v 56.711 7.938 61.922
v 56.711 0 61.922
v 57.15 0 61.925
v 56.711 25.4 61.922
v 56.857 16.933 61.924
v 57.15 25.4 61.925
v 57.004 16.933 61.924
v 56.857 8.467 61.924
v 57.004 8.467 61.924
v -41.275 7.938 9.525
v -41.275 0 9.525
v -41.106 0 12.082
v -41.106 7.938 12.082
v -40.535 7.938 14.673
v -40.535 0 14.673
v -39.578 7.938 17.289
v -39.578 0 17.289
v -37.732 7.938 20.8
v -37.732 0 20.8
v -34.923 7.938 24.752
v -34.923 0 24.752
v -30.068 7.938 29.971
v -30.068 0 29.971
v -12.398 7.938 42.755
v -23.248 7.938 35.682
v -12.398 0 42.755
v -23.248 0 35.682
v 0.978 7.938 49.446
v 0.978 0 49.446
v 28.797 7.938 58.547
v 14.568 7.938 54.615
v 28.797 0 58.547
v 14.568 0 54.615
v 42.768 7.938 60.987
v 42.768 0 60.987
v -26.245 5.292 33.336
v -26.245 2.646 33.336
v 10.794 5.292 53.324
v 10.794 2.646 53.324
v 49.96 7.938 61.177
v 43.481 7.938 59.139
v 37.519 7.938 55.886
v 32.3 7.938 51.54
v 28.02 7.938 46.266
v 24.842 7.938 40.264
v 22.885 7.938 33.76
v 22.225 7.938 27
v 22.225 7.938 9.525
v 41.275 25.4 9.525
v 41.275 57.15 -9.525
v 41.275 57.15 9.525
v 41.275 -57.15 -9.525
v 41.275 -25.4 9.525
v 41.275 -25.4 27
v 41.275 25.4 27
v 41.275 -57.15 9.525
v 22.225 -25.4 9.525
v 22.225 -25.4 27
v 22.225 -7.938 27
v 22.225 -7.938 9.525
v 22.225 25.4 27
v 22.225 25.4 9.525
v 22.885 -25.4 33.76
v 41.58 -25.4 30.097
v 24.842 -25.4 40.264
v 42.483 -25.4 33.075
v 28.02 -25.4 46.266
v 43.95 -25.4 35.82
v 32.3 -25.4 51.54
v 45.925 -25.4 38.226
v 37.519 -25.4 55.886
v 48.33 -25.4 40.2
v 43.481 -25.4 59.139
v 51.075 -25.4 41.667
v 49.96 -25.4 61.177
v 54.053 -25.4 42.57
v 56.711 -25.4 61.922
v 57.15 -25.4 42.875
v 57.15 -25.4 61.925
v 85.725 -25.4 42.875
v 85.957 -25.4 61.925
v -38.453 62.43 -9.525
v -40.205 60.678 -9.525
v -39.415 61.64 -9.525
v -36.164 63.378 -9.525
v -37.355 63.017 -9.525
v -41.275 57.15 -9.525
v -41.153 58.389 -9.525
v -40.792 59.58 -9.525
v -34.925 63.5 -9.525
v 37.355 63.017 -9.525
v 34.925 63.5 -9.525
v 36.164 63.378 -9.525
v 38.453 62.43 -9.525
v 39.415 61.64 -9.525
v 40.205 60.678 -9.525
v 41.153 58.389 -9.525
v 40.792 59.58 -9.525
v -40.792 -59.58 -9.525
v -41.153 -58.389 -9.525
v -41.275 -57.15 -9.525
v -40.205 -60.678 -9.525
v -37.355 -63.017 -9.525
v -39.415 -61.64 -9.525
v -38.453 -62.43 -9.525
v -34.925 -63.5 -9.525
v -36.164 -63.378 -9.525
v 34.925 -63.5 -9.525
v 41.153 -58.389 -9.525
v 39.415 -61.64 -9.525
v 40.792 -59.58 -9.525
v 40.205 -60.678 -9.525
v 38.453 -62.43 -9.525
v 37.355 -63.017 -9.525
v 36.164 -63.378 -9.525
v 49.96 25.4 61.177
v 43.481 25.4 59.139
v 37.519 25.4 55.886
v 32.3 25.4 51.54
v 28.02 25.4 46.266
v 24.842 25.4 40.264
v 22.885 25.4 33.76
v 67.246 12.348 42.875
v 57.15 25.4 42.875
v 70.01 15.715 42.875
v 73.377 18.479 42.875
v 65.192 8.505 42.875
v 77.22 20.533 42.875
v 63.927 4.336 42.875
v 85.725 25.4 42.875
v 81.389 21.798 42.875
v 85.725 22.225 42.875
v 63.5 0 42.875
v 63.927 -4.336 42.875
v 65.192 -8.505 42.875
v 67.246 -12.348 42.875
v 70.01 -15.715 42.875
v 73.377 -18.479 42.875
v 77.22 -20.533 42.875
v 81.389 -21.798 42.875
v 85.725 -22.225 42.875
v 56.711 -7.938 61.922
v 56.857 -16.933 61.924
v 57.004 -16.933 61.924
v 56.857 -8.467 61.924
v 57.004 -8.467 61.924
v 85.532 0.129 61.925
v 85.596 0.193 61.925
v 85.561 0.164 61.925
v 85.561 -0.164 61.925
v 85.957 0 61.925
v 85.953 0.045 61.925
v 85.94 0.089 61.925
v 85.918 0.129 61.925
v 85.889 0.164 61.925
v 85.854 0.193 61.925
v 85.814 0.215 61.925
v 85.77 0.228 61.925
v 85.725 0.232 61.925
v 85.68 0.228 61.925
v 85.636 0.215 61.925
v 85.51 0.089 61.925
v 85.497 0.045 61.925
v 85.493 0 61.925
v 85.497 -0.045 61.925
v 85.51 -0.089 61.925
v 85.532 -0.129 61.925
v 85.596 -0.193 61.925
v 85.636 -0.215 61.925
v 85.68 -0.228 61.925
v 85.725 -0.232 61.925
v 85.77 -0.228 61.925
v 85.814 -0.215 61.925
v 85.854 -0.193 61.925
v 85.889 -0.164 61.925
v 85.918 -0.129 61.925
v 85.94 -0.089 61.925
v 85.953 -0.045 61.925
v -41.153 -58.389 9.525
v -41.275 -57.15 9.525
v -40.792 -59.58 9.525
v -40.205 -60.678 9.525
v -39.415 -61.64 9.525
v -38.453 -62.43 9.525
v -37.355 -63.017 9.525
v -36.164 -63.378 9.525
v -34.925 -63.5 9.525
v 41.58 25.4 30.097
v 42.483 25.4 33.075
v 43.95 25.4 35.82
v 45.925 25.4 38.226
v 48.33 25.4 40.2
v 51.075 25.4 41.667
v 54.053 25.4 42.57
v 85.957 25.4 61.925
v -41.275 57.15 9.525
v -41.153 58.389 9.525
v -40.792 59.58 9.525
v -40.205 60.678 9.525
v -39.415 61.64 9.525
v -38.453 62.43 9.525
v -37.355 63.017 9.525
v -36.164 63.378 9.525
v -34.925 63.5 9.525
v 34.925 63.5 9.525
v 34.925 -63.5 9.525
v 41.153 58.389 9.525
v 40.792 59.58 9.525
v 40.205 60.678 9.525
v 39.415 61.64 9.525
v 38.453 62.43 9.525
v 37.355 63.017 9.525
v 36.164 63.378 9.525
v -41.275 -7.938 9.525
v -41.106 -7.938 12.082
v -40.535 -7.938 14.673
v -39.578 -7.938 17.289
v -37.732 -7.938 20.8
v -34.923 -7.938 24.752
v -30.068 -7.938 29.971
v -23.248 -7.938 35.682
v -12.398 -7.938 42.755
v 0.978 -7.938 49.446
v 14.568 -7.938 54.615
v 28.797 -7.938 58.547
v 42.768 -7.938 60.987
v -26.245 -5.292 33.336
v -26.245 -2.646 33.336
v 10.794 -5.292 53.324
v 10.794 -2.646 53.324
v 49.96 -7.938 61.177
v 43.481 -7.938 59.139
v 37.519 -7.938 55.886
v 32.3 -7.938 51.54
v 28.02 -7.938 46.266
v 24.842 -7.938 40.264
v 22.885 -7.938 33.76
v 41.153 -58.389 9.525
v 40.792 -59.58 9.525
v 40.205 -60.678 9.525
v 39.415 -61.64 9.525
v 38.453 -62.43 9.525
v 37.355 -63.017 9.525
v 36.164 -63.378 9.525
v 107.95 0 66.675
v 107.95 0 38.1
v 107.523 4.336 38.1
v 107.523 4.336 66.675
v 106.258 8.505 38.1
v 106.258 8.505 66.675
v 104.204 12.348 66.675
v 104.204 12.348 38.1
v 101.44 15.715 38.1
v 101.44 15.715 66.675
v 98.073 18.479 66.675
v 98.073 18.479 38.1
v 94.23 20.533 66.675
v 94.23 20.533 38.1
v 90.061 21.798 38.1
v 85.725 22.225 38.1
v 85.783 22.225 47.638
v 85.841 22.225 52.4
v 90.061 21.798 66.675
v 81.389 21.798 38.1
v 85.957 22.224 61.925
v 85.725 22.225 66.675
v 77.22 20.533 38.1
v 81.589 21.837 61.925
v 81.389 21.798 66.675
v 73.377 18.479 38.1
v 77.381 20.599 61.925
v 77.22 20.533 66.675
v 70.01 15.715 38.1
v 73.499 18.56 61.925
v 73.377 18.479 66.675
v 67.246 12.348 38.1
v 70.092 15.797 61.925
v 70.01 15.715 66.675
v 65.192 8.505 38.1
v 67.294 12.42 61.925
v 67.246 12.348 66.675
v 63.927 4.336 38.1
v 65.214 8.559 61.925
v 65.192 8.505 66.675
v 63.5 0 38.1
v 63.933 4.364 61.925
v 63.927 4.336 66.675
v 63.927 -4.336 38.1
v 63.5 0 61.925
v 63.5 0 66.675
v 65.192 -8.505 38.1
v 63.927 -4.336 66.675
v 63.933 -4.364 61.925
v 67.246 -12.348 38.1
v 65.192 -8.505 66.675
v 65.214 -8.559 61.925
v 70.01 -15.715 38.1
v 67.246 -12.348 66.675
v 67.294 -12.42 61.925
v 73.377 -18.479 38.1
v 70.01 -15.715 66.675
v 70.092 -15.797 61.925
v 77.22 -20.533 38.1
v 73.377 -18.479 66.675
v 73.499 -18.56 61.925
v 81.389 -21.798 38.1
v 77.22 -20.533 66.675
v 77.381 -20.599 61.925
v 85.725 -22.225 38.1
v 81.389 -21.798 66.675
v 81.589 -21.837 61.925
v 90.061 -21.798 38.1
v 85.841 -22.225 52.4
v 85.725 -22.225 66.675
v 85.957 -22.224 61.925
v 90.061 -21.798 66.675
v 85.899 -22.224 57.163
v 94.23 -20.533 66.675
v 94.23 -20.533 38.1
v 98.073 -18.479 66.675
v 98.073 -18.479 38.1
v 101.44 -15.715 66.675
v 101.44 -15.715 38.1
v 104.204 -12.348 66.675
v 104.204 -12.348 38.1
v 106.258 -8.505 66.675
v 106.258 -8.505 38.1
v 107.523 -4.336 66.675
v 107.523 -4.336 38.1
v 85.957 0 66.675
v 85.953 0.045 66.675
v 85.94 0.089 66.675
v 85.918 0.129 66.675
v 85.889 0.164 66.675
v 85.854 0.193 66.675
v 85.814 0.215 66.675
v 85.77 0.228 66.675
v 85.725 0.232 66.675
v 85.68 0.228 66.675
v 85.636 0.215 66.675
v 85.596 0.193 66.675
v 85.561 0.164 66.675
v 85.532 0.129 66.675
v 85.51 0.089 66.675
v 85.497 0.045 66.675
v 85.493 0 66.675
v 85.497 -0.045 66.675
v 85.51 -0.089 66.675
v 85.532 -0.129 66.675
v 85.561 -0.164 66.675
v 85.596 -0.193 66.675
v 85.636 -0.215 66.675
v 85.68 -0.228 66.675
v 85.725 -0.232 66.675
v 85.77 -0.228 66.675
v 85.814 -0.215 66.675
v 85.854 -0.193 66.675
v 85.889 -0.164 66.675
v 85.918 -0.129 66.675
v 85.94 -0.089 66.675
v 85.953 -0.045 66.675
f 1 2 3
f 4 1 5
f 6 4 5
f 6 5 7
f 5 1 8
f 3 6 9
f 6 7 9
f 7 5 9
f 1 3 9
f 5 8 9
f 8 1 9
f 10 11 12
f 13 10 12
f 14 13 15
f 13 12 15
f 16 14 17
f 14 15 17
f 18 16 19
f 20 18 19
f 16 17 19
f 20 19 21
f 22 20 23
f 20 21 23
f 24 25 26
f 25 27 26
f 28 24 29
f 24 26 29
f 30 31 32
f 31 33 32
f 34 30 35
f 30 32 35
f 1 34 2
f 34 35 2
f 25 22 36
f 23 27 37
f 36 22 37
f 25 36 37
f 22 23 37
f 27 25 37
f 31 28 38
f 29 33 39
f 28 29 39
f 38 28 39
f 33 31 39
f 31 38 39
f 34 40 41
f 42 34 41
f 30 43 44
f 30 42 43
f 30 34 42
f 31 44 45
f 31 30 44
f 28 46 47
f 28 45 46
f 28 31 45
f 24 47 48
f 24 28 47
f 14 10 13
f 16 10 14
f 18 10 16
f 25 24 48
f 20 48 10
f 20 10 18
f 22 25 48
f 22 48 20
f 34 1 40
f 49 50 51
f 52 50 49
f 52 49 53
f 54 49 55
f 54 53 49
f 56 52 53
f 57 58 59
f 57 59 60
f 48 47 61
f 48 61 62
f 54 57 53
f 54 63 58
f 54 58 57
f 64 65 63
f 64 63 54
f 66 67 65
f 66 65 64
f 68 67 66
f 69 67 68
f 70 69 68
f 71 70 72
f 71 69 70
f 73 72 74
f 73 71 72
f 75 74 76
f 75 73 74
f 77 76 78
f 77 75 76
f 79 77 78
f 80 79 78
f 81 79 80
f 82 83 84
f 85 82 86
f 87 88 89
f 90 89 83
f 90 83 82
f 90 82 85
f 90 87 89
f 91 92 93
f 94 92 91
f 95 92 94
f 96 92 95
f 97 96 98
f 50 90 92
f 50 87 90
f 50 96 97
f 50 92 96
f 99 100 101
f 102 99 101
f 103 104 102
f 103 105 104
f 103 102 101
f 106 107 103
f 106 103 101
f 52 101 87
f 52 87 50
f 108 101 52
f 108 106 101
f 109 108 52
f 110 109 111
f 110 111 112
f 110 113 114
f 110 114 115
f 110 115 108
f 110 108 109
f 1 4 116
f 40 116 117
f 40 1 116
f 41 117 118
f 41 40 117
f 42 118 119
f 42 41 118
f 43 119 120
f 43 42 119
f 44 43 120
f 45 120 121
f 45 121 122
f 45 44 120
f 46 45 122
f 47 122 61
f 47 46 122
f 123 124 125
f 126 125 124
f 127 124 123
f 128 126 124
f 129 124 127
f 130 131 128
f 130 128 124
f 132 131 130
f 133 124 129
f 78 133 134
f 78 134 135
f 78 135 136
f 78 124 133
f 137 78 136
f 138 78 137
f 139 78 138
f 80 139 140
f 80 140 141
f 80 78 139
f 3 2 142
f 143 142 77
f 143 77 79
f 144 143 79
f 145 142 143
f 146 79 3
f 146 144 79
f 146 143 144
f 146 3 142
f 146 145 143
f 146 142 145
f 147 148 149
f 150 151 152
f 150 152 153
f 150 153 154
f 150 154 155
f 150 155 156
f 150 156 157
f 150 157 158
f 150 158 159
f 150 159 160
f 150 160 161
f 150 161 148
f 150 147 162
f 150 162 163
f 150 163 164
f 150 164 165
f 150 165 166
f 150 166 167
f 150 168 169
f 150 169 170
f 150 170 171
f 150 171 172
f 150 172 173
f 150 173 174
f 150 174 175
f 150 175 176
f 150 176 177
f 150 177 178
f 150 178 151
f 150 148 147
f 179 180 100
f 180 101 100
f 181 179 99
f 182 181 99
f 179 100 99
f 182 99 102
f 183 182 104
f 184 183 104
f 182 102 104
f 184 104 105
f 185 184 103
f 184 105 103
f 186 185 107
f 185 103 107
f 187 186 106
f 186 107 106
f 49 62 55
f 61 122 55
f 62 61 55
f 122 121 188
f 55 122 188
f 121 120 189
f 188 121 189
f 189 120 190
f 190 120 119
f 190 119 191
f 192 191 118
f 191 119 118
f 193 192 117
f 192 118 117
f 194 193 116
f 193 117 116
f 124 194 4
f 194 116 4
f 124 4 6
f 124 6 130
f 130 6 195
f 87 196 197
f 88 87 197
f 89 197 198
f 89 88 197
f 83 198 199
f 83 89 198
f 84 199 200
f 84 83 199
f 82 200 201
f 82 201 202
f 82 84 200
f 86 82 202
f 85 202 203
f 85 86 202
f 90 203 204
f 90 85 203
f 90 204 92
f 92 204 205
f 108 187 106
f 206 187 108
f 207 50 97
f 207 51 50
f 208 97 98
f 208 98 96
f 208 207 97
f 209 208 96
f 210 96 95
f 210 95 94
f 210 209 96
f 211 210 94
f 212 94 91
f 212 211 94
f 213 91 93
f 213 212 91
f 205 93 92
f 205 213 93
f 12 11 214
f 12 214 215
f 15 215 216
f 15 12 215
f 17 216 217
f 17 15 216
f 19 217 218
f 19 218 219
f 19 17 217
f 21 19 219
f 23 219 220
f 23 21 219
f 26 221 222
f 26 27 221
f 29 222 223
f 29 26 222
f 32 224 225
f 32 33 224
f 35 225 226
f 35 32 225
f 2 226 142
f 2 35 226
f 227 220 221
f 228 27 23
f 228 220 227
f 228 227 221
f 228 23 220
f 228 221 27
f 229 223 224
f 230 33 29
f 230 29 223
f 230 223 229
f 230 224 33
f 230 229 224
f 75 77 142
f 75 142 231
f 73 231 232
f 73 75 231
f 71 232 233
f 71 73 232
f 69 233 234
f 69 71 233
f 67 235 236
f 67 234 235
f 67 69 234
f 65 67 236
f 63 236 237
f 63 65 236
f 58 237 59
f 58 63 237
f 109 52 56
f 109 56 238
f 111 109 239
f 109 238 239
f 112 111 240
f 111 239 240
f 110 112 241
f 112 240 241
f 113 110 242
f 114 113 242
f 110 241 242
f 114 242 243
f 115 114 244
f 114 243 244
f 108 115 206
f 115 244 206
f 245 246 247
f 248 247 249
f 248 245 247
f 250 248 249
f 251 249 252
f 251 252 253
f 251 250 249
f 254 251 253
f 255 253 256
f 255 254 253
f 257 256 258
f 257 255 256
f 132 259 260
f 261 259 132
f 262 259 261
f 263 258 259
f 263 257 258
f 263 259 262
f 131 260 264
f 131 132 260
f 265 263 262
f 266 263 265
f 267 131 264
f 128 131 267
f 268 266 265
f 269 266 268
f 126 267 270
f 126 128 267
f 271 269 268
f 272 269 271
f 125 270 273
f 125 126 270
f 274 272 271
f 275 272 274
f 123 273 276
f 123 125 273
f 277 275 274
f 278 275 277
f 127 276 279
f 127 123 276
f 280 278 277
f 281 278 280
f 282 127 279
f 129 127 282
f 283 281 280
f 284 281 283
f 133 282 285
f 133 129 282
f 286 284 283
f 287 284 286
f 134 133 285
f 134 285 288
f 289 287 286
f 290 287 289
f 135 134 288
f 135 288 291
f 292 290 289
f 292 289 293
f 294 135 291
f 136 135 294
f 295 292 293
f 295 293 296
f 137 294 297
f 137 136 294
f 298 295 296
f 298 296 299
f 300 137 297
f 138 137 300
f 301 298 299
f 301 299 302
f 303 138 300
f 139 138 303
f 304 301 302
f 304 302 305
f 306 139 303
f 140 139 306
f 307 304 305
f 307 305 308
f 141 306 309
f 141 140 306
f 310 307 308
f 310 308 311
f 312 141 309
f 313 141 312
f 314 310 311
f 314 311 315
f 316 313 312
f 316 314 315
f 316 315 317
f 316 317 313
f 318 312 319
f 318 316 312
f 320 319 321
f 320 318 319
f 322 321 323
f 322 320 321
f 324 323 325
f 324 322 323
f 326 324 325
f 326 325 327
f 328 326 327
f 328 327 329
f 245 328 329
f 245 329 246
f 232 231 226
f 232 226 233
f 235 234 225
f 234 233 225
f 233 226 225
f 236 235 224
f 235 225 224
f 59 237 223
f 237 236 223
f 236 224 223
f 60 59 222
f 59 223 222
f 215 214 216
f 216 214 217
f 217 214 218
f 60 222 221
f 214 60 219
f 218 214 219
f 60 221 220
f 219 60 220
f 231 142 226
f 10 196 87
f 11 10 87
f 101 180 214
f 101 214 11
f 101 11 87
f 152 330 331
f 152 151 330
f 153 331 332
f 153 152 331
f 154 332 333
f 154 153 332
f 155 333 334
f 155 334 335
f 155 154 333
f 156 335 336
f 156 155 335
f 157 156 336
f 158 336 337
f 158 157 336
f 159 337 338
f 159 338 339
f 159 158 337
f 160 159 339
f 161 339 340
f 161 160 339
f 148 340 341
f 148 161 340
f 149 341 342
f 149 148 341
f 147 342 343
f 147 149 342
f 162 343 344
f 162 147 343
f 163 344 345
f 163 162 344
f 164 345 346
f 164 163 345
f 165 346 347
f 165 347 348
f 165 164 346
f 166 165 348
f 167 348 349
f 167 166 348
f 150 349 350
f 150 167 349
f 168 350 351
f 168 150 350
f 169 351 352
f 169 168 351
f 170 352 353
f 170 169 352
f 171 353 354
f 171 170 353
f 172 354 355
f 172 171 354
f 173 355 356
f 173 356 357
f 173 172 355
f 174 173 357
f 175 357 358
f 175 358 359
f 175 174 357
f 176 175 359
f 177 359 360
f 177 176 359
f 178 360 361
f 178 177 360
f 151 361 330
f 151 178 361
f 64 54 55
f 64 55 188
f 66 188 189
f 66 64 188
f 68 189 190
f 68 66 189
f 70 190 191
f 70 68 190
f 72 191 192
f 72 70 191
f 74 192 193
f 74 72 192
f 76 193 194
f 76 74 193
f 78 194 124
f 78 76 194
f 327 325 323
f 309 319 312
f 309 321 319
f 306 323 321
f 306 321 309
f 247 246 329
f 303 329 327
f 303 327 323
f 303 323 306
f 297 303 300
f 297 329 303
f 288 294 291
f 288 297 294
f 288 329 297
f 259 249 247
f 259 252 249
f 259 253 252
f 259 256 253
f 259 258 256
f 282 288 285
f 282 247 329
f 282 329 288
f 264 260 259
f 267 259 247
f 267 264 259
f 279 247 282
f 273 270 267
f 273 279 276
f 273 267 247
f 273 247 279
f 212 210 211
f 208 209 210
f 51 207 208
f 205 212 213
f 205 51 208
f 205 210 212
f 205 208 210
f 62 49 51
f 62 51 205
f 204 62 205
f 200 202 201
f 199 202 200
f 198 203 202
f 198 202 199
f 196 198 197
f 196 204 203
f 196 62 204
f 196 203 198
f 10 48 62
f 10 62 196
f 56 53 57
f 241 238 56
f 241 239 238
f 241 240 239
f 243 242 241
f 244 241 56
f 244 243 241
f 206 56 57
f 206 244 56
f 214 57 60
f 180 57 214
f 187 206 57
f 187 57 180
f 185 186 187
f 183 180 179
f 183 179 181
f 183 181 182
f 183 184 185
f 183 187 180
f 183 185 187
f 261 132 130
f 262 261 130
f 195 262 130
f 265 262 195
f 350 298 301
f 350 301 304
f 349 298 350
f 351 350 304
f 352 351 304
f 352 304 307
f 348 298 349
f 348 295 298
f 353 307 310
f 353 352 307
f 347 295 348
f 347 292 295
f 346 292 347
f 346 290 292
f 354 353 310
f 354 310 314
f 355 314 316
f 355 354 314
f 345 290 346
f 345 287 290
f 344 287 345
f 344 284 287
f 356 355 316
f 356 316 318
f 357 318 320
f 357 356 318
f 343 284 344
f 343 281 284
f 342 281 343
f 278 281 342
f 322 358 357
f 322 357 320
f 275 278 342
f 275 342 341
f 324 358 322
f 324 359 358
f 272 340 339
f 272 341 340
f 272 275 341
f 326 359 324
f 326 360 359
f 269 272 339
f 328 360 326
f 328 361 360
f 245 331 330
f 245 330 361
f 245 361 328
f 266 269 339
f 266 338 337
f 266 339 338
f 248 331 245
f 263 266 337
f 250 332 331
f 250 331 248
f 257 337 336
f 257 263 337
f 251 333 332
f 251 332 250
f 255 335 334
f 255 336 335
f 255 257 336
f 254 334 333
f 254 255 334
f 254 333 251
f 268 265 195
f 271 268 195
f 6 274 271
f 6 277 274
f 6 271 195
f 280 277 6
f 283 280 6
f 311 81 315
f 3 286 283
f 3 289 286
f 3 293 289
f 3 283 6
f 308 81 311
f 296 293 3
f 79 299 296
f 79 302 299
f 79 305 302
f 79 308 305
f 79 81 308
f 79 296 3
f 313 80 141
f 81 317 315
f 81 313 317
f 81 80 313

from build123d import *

# Parameters (mm, degrees)
F1_DEPTH = 63.5
F2_DEPTH = 25.4
F3_DEPTH = 7.9375
F5_R     = 6.35


with BuildPart() as f1:
    # F0 (on Front) → F1 (new body, symmetric)
    with BuildSketch(Plane.XZ):
        Polygon((-41.275, 9.525), (-41.275, -9.525), (41.275, -9.525), (41.275, 9.525), (22.225, 9.525), align=None)
    extrude(amount=F1_DEPTH, both=True)

    # F0 (on Front) → F2 (join, symmetric)
    with BuildSketch(Plane.XZ):
        with BuildLine():
            Line((22.225, 9.525), (41.275, 9.525))
            Line((41.275, 9.525), (41.275, 27.0002))
            ThreePointArc((41.275, 27.0002), (45.92468, 38.22552), (57.15, 42.8752))
            Line((57.15, 42.8752), (57.15, 61.9252))
            add(Edge.make_bspline(
                [(56.711113, 61.922442), (56.857474, 61.92365), (57.00377, 61.92457), (57.15, 61.9252)],
                knots=[111.150721, 111.150721, 111.150721, 111.150721, 111.504536, 111.504536, 111.504536, 111.504536], degree=3))
            ThreePointArc((56.711113, 61.922442), (32.29961, 51.540244), (22.225, 27.0002))
            Line((22.225, 27.0002), (22.225, 9.525))
        make_face()
        Polygon((85.957468, 61.9252), (57.15, 61.9252), (57.15, 42.8752), (85.725, 42.8752), align=None)
    extrude(amount=F2_DEPTH, both=True)

    # F0 (on Front) → F3 (join, symmetric)
    with BuildSketch(Plane.XZ):
        with BuildLine():
            add(Edge.make_bspline(
                [(-41.275, 9.525), (-41.625955, 32.723309), (10.731886, 61.543013), (56.711113, 61.922442)],
                knots=[0, 0, 0, 0, 111.150721, 111.150721, 111.150721, 111.150721], degree=3))
            Line((-41.275, 9.525), (22.225, 9.525))
            Line((22.225, 9.525), (22.225, 27.0002))
            ThreePointArc((22.225, 27.0002), (32.29961, 51.540244), (56.711113, 61.922442))
        make_face()
    extrude(amount=F3_DEPTH, both=True)

    # F0 (on Front) → F4 (revolve)
    with BuildSketch(Plane.XZ):
        Polygon((85.957468, 66.675), (85.957468, 61.9252), (85.725, 42.8752), (85.725, 38.1), (107.95, 38.1), (107.95, 66.675), align=None)
    revolve(axis=Axis((85.725, 0, 40.4876), (0, 0, 1)))

    # F5
    f5_edges = [f1.edges().sort_by_distance(p)[0] for p in [
        (-41.275, -63.5, 0),
        (41.275, -63.5, 0),
        (41.275, 63.5, 0),
        (-41.275, 63.5, 0),
    ]]
    fillet(f5_edges, radius=F5_R)


solid = f1.part
